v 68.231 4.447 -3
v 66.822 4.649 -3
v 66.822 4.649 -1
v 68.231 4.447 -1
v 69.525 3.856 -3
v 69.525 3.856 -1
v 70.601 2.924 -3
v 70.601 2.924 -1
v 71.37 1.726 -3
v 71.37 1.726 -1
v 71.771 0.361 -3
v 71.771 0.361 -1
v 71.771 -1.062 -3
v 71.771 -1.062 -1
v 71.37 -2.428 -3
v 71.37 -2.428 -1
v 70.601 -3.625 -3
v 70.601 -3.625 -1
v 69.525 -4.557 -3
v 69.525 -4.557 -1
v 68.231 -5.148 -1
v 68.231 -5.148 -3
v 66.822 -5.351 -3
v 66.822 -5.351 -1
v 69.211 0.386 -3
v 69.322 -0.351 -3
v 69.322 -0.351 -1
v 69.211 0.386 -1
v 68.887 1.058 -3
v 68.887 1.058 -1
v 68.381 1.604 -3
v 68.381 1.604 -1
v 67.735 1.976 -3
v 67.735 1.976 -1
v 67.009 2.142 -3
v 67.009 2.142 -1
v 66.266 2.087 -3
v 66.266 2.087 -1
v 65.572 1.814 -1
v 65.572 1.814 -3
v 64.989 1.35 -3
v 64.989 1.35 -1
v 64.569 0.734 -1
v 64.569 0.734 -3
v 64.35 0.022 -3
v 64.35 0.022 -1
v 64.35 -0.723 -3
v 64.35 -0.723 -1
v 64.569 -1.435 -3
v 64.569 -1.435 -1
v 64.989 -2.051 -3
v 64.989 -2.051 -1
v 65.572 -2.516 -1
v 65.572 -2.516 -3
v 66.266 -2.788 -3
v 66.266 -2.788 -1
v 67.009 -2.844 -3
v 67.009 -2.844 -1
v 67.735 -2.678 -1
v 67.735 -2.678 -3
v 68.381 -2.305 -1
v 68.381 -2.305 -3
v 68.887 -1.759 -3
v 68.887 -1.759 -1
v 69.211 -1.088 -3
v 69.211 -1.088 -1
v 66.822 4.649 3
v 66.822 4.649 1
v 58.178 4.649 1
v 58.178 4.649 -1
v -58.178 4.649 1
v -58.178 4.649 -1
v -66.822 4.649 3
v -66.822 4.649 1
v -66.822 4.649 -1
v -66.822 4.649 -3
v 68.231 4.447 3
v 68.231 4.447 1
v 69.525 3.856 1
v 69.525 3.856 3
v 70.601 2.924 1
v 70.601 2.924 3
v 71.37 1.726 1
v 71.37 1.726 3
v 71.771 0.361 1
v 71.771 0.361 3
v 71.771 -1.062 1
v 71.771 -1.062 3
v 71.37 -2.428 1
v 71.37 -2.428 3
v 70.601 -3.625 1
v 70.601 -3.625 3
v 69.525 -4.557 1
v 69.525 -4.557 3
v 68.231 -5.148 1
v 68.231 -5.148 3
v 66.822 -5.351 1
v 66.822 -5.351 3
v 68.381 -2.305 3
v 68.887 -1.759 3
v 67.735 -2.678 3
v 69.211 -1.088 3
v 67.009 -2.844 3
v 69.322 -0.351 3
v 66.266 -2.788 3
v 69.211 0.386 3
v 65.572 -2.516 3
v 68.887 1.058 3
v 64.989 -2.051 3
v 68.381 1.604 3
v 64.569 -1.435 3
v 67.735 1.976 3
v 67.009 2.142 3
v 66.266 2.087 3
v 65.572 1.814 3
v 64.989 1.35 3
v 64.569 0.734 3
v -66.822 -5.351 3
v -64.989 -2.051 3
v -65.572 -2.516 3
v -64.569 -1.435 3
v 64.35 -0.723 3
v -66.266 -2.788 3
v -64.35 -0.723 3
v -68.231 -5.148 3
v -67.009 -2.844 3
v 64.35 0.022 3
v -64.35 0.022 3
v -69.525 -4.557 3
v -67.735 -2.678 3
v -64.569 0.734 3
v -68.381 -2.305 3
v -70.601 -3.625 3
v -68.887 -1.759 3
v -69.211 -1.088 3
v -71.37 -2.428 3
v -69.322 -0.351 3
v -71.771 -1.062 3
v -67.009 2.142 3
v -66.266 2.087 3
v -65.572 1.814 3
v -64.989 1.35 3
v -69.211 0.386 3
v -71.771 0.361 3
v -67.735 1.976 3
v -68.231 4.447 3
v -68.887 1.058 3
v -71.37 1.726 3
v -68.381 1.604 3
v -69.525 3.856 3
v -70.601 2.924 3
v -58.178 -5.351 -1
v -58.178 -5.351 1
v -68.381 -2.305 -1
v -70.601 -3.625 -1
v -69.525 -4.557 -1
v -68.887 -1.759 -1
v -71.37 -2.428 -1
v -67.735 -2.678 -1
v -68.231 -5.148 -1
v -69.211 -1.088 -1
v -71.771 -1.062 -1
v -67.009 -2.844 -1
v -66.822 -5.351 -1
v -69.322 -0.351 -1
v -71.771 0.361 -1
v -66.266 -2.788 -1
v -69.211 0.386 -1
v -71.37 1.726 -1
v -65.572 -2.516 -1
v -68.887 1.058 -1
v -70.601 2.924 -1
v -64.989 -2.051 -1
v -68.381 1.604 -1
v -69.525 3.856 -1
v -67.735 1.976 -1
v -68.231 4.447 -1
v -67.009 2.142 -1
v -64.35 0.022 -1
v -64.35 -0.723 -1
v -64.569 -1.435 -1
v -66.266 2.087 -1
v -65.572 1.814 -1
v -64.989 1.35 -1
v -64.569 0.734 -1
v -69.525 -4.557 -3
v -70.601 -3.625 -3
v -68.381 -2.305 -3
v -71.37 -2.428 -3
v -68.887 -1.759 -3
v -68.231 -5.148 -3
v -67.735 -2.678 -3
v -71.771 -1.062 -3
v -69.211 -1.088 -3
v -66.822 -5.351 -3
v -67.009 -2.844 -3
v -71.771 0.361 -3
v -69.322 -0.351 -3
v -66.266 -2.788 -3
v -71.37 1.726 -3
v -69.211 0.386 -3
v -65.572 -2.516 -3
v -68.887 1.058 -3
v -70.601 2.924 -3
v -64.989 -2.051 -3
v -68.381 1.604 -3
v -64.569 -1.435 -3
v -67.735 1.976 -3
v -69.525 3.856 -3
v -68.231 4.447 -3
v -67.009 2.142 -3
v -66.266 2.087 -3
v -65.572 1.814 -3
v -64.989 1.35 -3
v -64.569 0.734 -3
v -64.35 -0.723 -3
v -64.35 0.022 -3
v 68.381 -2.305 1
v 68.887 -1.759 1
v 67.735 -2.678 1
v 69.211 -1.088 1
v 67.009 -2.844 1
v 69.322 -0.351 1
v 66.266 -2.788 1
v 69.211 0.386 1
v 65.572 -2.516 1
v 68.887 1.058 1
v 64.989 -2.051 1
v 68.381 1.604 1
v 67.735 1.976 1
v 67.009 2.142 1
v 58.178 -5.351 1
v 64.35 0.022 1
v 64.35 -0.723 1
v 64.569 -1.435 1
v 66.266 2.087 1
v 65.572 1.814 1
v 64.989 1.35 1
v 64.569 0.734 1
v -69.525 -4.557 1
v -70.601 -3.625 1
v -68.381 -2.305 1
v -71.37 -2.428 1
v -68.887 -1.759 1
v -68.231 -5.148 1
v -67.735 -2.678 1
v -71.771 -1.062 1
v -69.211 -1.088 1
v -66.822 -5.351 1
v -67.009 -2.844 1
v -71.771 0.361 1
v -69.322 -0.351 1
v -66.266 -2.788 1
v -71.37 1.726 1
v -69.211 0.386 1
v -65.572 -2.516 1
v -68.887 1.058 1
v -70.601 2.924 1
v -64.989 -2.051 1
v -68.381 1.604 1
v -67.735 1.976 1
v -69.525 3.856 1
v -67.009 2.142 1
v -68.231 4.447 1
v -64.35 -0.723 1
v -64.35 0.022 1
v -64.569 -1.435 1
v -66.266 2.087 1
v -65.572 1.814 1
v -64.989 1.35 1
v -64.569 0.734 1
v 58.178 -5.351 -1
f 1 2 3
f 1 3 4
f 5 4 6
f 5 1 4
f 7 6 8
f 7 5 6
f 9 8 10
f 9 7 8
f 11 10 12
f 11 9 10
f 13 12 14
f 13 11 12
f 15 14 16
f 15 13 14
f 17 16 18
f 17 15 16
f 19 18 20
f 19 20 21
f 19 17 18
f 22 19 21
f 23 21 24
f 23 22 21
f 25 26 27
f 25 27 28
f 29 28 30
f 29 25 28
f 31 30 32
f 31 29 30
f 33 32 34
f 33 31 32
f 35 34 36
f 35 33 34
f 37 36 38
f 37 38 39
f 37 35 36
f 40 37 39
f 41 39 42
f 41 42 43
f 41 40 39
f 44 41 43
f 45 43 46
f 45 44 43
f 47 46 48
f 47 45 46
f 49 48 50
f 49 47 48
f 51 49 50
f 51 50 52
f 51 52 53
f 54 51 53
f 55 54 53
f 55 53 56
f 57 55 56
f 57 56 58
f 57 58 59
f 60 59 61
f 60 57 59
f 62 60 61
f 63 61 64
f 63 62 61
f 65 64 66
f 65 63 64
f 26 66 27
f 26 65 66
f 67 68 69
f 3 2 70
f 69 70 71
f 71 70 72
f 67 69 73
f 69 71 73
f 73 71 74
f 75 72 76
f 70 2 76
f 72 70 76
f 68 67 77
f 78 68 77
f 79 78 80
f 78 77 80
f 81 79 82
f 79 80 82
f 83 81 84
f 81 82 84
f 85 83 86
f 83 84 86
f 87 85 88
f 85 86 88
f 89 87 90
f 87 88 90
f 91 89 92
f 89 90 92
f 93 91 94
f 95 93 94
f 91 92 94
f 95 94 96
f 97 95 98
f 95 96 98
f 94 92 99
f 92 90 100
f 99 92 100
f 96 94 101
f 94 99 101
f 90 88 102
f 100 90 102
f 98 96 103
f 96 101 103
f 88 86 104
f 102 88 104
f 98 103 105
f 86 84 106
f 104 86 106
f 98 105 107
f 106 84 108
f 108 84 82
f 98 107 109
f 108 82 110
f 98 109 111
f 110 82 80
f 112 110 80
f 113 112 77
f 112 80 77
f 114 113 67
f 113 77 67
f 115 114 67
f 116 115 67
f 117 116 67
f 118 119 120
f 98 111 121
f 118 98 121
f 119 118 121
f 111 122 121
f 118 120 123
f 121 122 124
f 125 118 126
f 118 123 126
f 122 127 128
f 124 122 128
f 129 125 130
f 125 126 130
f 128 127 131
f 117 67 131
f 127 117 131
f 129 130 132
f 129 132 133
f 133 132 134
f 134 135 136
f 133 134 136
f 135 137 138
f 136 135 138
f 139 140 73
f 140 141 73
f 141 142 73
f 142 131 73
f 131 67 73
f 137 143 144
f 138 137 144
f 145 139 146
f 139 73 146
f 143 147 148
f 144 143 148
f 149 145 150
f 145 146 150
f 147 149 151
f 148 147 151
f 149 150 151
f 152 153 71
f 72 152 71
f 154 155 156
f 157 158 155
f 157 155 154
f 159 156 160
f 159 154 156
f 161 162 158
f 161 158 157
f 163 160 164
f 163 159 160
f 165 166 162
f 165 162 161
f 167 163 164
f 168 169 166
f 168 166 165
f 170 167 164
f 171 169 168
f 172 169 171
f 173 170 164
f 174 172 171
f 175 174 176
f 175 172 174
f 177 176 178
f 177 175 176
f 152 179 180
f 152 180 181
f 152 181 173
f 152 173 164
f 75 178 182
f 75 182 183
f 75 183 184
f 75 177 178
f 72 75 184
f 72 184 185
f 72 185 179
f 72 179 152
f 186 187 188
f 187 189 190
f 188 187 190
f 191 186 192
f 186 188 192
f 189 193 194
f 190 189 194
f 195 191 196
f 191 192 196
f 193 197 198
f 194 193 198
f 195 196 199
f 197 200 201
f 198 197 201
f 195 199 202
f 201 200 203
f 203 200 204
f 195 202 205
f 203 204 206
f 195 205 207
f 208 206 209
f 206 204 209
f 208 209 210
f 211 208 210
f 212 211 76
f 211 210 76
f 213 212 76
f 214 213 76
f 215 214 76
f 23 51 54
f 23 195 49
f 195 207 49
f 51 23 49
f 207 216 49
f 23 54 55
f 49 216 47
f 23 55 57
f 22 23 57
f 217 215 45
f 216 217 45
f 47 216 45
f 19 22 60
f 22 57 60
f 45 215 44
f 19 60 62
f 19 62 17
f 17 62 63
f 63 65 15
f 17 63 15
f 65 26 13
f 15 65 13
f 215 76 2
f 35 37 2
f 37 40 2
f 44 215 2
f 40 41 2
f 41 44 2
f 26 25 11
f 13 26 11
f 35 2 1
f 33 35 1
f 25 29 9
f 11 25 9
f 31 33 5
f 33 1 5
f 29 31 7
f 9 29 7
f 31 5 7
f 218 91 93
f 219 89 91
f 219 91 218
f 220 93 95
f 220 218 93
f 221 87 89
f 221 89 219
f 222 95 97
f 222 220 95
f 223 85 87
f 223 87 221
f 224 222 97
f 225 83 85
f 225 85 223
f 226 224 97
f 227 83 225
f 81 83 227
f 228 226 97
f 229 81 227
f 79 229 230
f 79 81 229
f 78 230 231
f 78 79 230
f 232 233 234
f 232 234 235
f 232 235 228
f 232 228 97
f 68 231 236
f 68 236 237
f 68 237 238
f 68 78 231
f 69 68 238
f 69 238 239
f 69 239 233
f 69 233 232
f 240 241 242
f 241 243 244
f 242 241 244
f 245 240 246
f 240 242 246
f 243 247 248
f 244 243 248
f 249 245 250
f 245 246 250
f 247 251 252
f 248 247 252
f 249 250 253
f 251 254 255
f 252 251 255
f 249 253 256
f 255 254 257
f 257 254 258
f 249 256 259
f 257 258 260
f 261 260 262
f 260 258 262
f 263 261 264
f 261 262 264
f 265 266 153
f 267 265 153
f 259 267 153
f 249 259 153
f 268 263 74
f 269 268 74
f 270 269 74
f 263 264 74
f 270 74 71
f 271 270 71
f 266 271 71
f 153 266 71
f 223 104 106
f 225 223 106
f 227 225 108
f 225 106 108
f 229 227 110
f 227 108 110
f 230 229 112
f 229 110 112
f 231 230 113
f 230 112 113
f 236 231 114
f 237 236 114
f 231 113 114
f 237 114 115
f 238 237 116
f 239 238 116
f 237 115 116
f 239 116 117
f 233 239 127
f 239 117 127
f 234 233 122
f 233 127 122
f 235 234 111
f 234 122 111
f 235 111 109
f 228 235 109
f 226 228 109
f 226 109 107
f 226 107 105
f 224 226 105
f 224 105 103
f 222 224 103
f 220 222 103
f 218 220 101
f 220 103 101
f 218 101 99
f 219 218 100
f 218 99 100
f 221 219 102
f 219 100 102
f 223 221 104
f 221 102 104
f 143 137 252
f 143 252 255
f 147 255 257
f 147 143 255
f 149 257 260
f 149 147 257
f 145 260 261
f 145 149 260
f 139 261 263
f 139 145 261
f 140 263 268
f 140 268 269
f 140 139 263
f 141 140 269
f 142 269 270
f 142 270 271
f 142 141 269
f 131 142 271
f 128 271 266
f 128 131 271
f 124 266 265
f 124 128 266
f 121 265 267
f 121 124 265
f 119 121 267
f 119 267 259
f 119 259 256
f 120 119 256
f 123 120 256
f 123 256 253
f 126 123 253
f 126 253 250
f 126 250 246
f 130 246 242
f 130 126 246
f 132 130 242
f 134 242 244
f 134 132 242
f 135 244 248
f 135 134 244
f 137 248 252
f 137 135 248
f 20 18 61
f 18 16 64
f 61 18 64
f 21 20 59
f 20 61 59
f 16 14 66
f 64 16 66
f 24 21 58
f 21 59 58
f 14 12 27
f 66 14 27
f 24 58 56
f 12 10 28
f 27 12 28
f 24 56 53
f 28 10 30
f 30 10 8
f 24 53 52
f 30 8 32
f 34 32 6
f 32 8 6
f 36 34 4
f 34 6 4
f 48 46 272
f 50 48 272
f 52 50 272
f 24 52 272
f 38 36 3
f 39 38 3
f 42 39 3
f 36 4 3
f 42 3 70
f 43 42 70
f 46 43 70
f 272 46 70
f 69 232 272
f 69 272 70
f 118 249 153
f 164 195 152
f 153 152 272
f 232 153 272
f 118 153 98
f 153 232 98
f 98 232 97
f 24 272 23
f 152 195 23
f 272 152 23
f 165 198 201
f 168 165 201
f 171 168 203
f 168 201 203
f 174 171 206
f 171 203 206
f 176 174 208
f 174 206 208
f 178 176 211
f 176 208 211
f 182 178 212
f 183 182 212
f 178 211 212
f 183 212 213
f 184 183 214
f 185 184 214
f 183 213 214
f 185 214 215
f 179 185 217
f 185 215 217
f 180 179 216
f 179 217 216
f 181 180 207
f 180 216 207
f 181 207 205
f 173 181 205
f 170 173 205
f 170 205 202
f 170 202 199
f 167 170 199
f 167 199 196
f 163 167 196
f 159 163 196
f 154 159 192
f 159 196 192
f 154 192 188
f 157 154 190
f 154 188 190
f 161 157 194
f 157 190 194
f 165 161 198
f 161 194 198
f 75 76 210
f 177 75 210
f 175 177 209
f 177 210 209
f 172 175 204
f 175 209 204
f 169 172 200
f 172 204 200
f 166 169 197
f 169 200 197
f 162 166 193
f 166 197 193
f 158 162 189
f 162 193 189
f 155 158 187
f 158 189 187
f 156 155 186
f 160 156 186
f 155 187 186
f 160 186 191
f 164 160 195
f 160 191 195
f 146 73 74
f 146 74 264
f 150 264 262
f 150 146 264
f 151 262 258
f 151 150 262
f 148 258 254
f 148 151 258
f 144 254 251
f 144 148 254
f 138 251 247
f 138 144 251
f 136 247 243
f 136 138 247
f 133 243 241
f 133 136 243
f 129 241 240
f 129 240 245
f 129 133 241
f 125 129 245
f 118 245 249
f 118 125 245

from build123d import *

# Parameters (mm, degrees)
SKETCH19_W               = 115
SKETCH19_H               = 10
BOSS_EXTRUDE4_DEPTH      = 3
SKETCH21_R               = 2.5
BOSS_EXTRUDE13_DEPTH     = 2
MIRROR15_COPY_1_SKETCH_W = 115
MIRROR15_COPY_1_SKETCH_H = 10
MIRROR15_COPY_1_DEPTH    = 3
MIRROR15_COPY_2_SKETCH_R = 2.5
MIRROR15_COPY_2_DEPTH    = 2


with BuildPart() as part:
    # Sketch19 → Boss-Extrude4 (new body, symmetric)
    with BuildSketch(Plane.XY):
        with Locations((-0.678145843, -0.350765091)):
            Rectangle(SKETCH19_W, SKETCH19_H)
    boss_extrude4 = extrude(amount=BOSS_EXTRUDE4_DEPTH, both=True)

    # Sketch21 → Boss-Extrude13 (add)
    with BuildSketch(Plane.XY.offset(3)):
        with BuildLine():
            ThreePointArc((66.821854157, 4.649234909), (71.821854157, -0.350765091), (66.821854157, -5.350765091))
            Line((66.821854157, -5.350765091), (56.821854157, -5.350765091))
            Line((56.821854157, -5.350765091), (56.821854157, 4.649234909))
            Line((56.821854157, 4.649234909), (66.821854157, 4.649234909))
        make_face()
        with Locations((66.821854157, -0.350765091)):
            Circle(SKETCH21_R, mode=Mode.SUBTRACT)
    boss_extrude13 = extrude(amount=-BOSS_EXTRUDE13_DEPTH)

    # Mirror14: Boss-Extrude4, Boss-Extrude13 across plane
    add(boss_extrude4.mirror(Plane.XY))
    add(boss_extrude13.mirror(Plane.XY))

    # Mirror15: Boss-Extrude4, Boss-Extrude13 across plane
    add(boss_extrude4.mirror(Plane(origin=(0, 0, 0), x_dir=(0, 0, 1), z_dir=(1, 0, 0))))
    add(boss_extrude13.mirror(Plane(origin=(0, 0, 0), x_dir=(0, 0, 1), z_dir=(1, 0, 0))))

    # Mirror15 copy 1 sketch → Mirror15 copy 1 (add, symmetric)
    with BuildSketch(Plane(origin=(0, 0, 0), x_dir=(-1, 0, 0), z_dir=(0, 0, -1))):
        with Locations((-0.678145843, -0.350765091)):
            Rectangle(MIRROR15_COPY_1_SKETCH_W, MIRROR15_COPY_1_SKETCH_H)
    extrude(amount=MIRROR15_COPY_1_DEPTH, both=True)

    # Mirror15 copy 2 sketch → Mirror15 copy 2 (add)
    with BuildSketch(Plane(origin=(0, 0, -3), x_dir=(-1, 0, 0), z_dir=(0, 0, -1))):
        with BuildLine():
            ThreePointArc((66.821854157, 4.649234909), (71.821854157, -0.350765091), (66.821854157, -5.350765091))
            Line((66.821854157, -5.350765091), (56.821854157, -5.350765091))
            Line((56.821854157, -5.350765091), (56.821854157, 4.649234909))
            Line((56.821854157, 4.649234909), (66.821854157, 4.649234909))
        make_face()
        with Locations((66.821854157, -0.350765091)):
            Circle(MIRROR15_COPY_2_SKETCH_R, mode=Mode.SUBTRACT)
    extrude(amount=-MIRROR15_COPY_2_DEPTH)


solid = part.part
